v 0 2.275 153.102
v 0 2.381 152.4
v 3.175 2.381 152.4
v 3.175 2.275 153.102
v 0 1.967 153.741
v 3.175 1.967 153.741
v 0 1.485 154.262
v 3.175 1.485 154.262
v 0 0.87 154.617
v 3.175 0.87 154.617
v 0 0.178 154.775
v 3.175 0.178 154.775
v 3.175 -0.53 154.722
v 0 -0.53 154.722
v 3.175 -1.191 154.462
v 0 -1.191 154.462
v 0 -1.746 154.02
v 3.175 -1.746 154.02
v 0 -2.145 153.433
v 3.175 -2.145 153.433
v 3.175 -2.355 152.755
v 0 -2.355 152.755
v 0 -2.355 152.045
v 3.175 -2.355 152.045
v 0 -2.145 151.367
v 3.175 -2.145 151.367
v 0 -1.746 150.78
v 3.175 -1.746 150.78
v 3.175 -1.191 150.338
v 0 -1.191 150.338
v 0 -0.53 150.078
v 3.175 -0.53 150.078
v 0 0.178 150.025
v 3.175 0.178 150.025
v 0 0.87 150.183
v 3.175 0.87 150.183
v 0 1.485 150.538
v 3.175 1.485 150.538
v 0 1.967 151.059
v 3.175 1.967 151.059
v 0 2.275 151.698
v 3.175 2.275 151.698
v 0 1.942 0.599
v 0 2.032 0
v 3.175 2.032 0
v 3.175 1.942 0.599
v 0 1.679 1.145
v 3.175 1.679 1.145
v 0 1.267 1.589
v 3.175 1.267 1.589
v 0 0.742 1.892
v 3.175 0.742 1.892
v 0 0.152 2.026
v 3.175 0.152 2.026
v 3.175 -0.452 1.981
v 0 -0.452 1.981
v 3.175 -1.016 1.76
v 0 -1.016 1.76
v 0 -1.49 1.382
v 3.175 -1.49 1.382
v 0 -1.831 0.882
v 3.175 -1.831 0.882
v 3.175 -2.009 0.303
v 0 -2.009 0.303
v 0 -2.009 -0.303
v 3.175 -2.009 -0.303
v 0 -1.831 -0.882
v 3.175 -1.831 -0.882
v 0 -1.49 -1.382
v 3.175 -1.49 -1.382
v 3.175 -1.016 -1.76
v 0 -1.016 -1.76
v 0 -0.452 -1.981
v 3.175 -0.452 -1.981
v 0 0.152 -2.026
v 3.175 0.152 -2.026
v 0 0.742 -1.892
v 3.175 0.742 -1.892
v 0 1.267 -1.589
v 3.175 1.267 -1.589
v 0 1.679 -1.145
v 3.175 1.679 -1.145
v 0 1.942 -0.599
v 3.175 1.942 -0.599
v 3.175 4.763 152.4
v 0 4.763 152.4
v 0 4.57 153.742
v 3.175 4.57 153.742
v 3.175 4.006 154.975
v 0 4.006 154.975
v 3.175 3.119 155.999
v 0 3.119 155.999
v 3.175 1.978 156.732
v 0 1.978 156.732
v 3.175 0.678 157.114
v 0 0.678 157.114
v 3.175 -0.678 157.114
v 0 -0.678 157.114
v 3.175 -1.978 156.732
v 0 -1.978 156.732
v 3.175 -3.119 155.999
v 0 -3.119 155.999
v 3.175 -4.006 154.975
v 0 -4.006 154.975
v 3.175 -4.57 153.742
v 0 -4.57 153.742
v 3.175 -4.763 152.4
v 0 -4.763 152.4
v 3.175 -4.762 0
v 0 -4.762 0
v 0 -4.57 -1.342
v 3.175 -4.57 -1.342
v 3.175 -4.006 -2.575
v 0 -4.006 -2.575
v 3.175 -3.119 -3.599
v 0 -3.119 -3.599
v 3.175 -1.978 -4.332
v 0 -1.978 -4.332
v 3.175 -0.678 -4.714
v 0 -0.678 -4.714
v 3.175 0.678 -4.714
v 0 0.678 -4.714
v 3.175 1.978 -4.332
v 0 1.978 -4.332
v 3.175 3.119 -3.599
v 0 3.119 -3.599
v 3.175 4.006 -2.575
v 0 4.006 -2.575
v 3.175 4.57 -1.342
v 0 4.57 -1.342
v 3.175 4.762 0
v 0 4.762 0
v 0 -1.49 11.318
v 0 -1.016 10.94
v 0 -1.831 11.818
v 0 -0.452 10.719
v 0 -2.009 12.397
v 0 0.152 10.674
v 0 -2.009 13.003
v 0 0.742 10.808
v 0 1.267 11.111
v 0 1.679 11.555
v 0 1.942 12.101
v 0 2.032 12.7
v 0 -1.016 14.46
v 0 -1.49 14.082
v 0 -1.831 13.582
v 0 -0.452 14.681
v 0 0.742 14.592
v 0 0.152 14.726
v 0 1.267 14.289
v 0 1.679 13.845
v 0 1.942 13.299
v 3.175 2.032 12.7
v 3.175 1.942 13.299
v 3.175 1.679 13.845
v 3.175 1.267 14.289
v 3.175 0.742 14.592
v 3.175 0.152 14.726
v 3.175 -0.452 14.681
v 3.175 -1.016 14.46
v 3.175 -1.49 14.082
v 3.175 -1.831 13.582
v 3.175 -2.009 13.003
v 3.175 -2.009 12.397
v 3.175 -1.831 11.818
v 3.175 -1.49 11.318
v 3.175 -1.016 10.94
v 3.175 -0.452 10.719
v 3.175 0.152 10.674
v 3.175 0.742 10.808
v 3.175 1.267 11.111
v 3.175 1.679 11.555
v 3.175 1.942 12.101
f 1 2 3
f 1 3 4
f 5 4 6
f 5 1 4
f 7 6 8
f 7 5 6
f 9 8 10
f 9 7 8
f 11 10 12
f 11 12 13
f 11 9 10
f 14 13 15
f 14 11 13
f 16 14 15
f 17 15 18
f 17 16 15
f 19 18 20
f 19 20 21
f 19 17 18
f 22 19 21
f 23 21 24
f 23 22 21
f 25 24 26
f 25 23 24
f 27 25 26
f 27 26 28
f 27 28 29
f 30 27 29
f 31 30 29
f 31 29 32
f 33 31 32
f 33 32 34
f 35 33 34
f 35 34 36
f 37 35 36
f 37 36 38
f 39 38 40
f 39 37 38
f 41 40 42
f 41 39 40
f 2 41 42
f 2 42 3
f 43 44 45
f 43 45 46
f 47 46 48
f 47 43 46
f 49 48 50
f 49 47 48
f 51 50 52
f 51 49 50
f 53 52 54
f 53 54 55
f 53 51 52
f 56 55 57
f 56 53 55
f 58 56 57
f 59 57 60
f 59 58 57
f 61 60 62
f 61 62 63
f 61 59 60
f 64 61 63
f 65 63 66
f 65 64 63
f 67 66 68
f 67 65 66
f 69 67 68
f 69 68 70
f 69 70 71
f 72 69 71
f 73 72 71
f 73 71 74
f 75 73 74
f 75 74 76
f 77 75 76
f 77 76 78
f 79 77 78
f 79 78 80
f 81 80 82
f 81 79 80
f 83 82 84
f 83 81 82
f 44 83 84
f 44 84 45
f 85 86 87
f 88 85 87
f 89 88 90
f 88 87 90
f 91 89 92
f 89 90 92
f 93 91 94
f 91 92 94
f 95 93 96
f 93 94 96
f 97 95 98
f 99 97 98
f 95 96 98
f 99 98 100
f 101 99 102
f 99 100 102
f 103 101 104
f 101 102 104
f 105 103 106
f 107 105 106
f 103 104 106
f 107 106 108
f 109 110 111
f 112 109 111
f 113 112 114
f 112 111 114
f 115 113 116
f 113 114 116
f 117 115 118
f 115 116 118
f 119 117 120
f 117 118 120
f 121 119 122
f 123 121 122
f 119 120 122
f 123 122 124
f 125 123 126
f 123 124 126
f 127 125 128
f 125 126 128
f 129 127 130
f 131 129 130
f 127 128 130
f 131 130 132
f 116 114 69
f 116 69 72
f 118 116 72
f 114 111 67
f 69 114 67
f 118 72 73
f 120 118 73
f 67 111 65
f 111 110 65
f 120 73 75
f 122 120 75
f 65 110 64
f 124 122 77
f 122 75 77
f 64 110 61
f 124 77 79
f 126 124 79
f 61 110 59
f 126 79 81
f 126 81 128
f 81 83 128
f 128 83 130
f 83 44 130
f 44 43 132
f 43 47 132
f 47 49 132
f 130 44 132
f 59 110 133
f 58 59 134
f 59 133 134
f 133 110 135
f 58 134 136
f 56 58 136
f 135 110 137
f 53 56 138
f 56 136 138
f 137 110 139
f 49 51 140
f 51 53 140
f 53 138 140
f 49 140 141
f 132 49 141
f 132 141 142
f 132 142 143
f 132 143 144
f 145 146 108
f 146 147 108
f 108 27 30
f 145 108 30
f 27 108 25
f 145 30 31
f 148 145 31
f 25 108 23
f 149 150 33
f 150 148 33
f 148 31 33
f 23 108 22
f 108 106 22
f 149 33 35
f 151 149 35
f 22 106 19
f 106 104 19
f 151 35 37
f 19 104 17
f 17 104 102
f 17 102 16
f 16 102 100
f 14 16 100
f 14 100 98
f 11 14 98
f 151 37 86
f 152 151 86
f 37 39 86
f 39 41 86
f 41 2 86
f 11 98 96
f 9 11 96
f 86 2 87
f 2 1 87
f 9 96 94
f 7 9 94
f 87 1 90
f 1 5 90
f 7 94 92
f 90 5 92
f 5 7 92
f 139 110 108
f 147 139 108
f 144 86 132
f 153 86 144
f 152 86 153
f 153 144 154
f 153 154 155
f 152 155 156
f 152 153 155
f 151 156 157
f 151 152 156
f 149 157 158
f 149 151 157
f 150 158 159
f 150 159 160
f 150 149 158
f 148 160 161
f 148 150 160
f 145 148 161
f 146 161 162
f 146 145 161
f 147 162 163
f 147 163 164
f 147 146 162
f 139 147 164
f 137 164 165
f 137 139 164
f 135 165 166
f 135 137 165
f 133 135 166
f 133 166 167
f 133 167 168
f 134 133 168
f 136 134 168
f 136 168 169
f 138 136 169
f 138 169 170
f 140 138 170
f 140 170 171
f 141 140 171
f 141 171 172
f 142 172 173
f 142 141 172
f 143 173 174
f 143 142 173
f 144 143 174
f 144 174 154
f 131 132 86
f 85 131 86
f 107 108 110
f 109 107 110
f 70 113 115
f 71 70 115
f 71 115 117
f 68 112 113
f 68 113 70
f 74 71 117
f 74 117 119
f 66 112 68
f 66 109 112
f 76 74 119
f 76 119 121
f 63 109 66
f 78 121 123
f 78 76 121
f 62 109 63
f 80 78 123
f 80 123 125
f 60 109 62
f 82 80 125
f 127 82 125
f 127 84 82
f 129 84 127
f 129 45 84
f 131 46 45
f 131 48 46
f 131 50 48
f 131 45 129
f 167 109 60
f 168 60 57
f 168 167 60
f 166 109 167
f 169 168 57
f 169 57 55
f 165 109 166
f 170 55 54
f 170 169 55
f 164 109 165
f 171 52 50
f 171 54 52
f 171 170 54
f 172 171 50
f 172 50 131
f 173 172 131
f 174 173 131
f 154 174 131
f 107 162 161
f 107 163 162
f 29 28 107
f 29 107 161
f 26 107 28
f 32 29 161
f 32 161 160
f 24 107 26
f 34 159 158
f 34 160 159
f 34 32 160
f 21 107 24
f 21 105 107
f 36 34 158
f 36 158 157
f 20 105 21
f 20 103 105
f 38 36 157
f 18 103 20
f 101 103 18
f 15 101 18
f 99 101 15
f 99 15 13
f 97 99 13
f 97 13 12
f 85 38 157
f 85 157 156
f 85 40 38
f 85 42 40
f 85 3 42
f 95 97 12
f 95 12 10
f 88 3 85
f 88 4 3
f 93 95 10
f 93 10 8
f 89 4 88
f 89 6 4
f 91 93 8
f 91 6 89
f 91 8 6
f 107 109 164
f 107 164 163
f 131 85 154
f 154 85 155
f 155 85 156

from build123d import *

# Parameters (mm, degrees)
F0_R     = 2.38125
F0_R_2   = 2.032
F1_DEPTH = 3.175


with BuildPart() as f1:
    # F0 (on Right) → F1 (new body)
    with BuildSketch(Plane.YZ):
        with BuildLine():
            ThreePointArc((-4.7625, 152.4), (0, 147.6375), (4.7625, 152.4))
            ThreePointArc((4.7625, 152.4), (0, 157.1625), (-4.7625, 152.4))
        make_face()
        with Locations((0, 152.4)):
            Circle(F0_R, mode=Mode.SUBTRACT)
        with BuildLine():
            Line((4.7625, 0), (4.7625, 152.4))
            ThreePointArc((4.7625, 152.4), (0, 147.6375), (-4.7625, 152.4))
            Line((-4.7625, 152.4), (-4.7625, 0))
            ThreePointArc((-4.7625, 0), (0, -4.7625), (4.7625, 0))
        make_face()
        Circle(F0_R_2, mode=Mode.SUBTRACT)
        with Locations((0, 12.7)):
            Circle(F0_R_2, mode=Mode.SUBTRACT)
    extrude(amount=F1_DEPTH)


solid = f1.part
